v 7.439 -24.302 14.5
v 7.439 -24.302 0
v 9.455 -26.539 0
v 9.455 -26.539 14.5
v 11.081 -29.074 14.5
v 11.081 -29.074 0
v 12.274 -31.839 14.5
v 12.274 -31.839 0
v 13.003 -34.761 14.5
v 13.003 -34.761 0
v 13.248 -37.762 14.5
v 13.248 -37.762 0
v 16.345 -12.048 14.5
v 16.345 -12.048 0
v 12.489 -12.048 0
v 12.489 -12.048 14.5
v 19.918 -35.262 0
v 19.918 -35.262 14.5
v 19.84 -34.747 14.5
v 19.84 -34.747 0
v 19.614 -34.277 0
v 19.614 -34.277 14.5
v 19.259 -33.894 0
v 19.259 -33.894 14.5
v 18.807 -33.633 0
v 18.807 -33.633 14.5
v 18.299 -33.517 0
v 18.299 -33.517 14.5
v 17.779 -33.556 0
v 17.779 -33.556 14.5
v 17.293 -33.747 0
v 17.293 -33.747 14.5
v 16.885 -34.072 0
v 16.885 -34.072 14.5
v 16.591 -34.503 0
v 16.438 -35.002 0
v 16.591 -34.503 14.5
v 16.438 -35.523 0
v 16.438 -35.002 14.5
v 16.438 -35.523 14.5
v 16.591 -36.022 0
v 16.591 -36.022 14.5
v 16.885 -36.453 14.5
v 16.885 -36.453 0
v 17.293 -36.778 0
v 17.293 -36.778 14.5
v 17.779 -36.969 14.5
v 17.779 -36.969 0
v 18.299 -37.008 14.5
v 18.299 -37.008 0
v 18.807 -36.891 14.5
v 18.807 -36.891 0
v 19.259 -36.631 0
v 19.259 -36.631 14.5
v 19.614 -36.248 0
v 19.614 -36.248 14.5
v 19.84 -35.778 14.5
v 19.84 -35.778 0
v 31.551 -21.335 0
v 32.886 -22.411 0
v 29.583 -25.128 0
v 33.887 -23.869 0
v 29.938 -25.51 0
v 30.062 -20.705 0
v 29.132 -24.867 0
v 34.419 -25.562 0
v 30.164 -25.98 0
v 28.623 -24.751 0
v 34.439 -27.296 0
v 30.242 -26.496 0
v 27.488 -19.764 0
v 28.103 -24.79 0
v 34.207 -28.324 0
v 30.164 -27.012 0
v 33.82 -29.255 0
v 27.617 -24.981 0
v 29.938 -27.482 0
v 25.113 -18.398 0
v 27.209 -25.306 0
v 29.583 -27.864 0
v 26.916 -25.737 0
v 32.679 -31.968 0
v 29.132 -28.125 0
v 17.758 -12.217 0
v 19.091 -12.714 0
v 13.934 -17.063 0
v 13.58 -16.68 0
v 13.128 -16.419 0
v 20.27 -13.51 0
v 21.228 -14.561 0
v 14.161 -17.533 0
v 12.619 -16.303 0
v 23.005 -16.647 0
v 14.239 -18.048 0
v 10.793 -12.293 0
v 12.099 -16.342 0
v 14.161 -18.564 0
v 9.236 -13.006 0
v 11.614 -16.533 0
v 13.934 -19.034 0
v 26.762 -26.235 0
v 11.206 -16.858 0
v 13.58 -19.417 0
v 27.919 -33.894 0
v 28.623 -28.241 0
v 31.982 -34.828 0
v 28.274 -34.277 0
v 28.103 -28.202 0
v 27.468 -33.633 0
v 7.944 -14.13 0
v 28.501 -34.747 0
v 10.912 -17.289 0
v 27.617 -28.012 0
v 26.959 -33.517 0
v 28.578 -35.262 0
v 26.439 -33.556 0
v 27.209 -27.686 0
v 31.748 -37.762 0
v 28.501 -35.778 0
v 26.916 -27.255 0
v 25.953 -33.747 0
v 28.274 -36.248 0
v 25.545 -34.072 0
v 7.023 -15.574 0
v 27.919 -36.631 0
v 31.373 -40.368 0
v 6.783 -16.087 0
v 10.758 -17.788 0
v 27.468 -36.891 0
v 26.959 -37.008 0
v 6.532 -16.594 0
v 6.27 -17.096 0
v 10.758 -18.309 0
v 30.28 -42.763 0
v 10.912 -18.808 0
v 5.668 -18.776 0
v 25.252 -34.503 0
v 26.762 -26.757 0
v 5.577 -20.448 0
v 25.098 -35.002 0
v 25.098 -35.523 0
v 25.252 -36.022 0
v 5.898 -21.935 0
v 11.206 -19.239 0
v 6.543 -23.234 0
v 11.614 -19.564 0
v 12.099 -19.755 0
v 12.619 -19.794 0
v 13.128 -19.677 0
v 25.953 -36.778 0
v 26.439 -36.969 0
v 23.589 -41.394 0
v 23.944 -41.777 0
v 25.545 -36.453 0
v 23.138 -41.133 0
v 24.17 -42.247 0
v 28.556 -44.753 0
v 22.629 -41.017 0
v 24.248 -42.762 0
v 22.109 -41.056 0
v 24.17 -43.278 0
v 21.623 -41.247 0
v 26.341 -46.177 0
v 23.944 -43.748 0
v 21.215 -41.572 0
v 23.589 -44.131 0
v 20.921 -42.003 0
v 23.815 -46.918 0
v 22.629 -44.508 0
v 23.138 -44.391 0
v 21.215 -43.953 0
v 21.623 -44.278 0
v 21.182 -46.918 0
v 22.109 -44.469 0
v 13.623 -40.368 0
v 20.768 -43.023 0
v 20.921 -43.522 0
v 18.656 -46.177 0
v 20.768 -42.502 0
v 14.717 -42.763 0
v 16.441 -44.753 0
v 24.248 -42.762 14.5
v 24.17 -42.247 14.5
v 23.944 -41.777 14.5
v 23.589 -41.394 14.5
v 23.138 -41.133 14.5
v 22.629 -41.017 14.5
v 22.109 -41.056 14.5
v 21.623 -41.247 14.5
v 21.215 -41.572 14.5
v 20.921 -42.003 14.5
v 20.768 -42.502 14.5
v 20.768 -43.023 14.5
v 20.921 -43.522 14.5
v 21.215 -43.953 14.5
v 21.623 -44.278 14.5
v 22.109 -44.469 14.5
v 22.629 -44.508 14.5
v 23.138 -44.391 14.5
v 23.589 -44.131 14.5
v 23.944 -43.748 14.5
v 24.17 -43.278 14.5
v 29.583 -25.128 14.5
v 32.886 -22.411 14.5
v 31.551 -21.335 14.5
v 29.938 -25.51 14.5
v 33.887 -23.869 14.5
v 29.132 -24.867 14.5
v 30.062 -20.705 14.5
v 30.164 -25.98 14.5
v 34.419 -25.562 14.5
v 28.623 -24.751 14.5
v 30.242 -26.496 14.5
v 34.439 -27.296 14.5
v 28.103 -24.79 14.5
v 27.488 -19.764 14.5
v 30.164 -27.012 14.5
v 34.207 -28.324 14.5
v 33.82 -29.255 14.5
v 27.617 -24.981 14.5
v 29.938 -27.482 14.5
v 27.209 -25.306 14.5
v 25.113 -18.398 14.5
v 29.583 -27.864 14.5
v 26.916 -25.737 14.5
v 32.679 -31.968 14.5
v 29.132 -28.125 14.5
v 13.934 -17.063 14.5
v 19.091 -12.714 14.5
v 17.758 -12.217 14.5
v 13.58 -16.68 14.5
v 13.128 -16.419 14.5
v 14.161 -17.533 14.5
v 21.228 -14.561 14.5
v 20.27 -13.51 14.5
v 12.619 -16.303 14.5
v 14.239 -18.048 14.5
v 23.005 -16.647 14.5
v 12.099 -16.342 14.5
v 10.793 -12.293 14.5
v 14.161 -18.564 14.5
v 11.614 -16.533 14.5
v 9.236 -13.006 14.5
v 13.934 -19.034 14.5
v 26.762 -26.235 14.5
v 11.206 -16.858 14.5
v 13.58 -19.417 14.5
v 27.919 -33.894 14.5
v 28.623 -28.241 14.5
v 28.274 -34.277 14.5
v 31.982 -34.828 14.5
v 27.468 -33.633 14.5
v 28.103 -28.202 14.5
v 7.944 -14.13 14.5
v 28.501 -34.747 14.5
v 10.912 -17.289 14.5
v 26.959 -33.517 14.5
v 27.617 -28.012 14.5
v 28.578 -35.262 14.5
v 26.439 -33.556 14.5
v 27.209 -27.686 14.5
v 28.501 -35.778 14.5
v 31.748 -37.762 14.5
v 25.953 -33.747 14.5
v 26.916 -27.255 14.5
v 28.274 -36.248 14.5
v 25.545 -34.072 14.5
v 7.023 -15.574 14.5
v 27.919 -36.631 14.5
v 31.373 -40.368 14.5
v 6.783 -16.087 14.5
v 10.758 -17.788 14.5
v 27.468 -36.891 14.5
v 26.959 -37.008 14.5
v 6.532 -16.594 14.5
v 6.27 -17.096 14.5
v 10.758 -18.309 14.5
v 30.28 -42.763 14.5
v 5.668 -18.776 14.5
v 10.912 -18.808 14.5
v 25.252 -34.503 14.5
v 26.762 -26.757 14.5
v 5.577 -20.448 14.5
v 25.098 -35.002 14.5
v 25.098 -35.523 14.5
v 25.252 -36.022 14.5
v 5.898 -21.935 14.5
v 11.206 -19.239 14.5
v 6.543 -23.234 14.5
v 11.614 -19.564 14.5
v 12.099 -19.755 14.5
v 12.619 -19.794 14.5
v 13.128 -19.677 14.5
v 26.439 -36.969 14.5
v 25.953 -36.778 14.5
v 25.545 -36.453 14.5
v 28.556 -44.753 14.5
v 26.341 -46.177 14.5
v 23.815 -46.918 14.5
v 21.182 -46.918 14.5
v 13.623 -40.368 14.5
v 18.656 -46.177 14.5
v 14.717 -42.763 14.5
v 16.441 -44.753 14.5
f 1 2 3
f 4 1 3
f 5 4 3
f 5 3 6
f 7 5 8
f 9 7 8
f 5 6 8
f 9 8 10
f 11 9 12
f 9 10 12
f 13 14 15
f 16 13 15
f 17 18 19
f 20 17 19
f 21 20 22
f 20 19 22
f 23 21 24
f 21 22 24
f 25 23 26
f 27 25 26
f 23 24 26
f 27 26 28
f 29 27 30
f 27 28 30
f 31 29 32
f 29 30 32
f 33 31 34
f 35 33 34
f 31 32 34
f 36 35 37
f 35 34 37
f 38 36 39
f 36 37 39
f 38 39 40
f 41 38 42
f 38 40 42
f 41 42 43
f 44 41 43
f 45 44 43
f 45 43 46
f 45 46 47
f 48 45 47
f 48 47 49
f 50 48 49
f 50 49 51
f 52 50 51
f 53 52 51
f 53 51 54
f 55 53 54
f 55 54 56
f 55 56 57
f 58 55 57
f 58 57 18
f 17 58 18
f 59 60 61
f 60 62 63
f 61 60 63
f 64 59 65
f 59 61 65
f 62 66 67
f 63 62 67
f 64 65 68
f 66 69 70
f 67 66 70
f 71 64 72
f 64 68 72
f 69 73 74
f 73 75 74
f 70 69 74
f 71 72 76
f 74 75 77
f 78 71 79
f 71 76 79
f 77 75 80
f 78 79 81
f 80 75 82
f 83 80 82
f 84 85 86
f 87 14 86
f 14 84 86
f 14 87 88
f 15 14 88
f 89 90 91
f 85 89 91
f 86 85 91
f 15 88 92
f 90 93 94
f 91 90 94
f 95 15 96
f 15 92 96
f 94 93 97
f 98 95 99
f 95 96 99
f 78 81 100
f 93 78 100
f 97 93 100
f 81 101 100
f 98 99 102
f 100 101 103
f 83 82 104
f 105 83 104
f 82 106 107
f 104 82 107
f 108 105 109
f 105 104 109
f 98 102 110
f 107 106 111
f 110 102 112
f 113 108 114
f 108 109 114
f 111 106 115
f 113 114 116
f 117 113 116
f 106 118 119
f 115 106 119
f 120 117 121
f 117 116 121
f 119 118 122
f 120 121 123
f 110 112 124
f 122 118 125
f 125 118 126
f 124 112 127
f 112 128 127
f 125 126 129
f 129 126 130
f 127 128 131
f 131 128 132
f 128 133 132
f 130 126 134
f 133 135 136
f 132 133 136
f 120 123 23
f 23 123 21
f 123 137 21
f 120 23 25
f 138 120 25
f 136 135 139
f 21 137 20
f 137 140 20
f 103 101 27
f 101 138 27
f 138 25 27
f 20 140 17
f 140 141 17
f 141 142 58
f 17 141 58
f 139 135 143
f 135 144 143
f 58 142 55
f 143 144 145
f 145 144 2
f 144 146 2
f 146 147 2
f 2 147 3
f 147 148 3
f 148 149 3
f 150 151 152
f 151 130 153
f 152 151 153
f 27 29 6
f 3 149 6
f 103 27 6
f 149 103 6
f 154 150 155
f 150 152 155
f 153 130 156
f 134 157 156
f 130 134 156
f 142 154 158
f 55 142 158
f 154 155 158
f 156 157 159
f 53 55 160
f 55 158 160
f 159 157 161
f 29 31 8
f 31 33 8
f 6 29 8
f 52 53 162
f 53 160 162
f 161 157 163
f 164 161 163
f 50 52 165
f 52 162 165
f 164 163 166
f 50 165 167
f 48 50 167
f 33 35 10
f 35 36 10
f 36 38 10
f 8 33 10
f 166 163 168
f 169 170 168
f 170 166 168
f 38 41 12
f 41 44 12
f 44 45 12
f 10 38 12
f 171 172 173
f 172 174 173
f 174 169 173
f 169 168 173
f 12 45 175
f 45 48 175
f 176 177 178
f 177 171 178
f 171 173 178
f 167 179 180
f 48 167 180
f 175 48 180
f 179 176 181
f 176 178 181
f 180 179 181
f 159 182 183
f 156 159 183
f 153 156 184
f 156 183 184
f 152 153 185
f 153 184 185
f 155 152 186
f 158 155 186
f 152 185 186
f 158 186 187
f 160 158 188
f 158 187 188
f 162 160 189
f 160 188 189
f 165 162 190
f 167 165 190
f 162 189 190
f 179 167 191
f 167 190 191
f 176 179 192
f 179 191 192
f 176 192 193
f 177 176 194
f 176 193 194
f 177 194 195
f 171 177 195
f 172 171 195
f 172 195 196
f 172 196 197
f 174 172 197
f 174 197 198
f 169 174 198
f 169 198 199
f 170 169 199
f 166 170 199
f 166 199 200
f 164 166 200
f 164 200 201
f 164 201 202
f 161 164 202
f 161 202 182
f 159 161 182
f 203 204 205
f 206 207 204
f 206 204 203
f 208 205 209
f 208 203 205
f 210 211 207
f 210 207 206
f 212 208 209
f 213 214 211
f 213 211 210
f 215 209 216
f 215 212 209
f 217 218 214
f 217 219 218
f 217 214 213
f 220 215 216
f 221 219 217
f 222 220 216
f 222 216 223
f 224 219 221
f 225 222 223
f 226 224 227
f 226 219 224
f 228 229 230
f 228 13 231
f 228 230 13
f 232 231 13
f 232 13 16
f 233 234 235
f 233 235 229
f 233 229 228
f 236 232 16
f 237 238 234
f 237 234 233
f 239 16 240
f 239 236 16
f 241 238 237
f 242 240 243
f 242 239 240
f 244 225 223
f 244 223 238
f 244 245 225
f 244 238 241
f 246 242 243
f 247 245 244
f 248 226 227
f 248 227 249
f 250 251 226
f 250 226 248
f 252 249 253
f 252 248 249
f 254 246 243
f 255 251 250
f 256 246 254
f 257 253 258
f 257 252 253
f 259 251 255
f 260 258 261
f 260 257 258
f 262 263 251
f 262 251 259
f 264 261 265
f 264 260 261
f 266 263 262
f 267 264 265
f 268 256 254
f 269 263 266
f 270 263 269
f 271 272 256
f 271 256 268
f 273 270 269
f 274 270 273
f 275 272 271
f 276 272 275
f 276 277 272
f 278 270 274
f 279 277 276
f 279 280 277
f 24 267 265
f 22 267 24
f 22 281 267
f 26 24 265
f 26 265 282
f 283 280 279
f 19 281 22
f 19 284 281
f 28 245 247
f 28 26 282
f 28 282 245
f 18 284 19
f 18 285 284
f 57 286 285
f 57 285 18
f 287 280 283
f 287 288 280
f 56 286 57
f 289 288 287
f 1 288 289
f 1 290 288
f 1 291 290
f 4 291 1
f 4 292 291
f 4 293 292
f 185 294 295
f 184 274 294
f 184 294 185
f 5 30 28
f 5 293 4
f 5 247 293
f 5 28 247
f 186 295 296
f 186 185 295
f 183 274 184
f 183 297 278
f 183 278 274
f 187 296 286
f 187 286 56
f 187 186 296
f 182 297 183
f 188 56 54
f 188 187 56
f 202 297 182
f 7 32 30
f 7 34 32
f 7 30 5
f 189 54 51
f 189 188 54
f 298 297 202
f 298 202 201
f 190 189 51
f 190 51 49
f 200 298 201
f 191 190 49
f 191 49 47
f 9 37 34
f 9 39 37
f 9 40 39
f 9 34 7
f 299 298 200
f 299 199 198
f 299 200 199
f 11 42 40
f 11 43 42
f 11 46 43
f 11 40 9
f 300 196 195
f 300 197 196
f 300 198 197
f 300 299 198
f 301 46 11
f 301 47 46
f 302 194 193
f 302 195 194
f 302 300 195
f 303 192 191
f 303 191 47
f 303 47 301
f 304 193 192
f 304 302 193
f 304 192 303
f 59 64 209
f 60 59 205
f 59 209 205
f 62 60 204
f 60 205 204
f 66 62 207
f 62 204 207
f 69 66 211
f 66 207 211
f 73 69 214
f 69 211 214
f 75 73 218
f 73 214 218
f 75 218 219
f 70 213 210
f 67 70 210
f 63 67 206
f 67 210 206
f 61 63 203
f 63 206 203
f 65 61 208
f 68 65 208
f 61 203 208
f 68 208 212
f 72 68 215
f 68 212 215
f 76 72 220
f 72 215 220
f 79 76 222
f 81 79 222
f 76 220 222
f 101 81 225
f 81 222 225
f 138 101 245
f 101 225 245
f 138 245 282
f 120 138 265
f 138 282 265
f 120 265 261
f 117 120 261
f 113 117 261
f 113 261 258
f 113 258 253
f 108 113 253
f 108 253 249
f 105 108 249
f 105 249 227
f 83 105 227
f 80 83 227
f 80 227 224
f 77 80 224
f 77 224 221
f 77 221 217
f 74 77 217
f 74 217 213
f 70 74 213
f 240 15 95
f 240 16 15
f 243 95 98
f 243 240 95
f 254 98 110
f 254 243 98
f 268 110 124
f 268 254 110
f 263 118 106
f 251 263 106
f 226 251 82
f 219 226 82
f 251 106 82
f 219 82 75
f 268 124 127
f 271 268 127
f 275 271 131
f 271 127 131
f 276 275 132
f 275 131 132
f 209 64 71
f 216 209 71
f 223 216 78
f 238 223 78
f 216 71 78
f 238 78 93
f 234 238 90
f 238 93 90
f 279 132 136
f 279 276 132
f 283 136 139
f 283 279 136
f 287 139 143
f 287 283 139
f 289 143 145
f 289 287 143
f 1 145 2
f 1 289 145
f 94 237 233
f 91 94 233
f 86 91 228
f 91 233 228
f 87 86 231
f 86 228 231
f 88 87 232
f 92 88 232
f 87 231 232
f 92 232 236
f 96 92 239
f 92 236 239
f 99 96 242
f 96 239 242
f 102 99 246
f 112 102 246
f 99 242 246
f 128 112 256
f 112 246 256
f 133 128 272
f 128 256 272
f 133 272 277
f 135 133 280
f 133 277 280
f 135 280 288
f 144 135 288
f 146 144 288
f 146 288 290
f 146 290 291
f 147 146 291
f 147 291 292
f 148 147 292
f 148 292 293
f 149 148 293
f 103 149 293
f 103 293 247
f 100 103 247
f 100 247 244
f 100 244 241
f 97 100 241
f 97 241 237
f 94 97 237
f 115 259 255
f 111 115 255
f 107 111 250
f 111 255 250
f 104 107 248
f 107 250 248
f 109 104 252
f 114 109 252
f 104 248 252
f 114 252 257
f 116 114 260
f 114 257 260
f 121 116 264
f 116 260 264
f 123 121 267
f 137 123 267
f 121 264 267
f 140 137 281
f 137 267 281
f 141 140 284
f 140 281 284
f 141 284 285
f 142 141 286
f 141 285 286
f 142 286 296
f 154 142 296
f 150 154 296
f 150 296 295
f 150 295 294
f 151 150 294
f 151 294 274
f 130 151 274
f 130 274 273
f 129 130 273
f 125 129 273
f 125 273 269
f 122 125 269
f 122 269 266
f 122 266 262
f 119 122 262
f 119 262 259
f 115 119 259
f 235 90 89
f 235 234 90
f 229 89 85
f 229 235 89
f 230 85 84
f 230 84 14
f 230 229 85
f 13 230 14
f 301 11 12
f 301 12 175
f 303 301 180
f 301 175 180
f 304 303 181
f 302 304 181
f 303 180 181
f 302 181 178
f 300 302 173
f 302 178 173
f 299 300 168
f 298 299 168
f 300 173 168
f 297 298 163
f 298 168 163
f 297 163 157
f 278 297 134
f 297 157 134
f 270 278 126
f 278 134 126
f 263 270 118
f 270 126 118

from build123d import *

# Parameters (mm, degrees)
EXTRUDE_2_DEPTH     = 14.5
FILLET_2_R          = 6
CUT_EXTRUDE_1_REACH = 62.084
SKETCH_2_R          = 1.75


with BuildPart() as part:
    # 草图1 → 凸台-拉伸2 (new body)
    with BuildSketch(Plane(origin=(0, 0, 0), x_dir=(-1, 0, 0), z_dir=(0, 0, 1))):
        with BuildLine():
            Line((-37.405308562, 24.446583048), (-45.355478911, 16.778806877))
            ThreePointArc((-45.355478911, 16.778806877), (-31.34055986, 20.996004639), (-19.758509765, 12.048444717))
            Line((-19.758509765, 12.048444717), (-8.309528731, 12.048444717))
            ThreePointArc((-8.309528731, 12.048444717), (-6.330928861, 16.982098954), (-3.353982561, 21.385914608))
            ThreePointArc((-3.353982561, 21.385914608), (-10.582575483, 28.195748099), (-13.248153532, 37.762413217))
            ThreePointArc((-13.248153532, 37.762413217), (-22.498153532, 47.012413217), (-31.748153532, 37.762413217))
            ThreePointArc((-31.748153532, 37.762413217), (-33.221077565, 30.528556429), (-37.405308562, 24.446583048))
        make_face()
    extrude(amount=EXTRUDE_2_DEPTH)

    # 圆角2
    fillet_2_edges = [part.edges().sort_by_distance(p)[0] for p in [
        (19.758509765, -12.048444717, 7.25),
    ]]
    fillet(fillet_2_edges, radius=FILLET_2_R)
    fillet_2_2_edges = [part.edges().sort_by_distance(p)[0] for p in [
        (8.309528731, -12.048444717, 7.25),
    ]]
    fillet(fillet_2_2_edges, radius=FILLET_2_R)
    fillet_2_3_edges = [part.edges().sort_by_distance(p)[0] for p in [
        (3.353982561, -21.385914608, 7.25),
    ]]
    fillet(fillet_2_3_edges, radius=FILLET_2_R)
    fillet_2_4_edges = [part.edges().sort_by_distance(p)[0] for p in [
        (45.355478911, -16.778806877, 7.25),
    ]]
    fillet(fillet_2_4_edges, radius=FILLET_2_R)

    # 草图2 → 切除-拉伸1 (cut, up to next)
    with BuildSketch(Plane.XY.offset(14.5), mode=Mode.PRIVATE) as cut_extrude_1_sk1:
        with Locations((22.498153532, -42.762413217)):
            Circle(SKETCH_2_R)
    cut_extrude_1_tool1 = extrude(cut_extrude_1_sk1.sketch, amount=-CUT_EXTRUDE_1_REACH, mode=Mode.PRIVATE) & part.part
    # 草图2 → 切除-拉伸1 (cut, up to next)
    with BuildSketch(Plane.XY.offset(14.5), mode=Mode.PRIVATE) as cut_extrude_1_sk2:
        with Locations((18.168026513, -35.262413217)):
            Circle(SKETCH_2_R)
    cut_extrude_1_tool2 = extrude(cut_extrude_1_sk2.sketch, amount=-CUT_EXTRUDE_1_REACH, mode=Mode.PRIVATE) & part.part
    # 草图2 → 切除-拉伸1 (cut, up to next)
    with BuildSketch(Plane.XY.offset(14.5), mode=Mode.PRIVATE) as cut_extrude_1_sk3:
        with Locations((26.828280551, -35.262413217)):
            Circle(SKETCH_2_R)
    cut_extrude_1_tool3 = extrude(cut_extrude_1_sk3.sketch, amount=-CUT_EXTRUDE_1_REACH, mode=Mode.PRIVATE) & part.part
    # 草图2 → 切除-拉伸1 (cut, up to next)
    with BuildSketch(Plane.XY.offset(14.5), mode=Mode.PRIVATE) as cut_extrude_1_sk4:
        with Locations((28.492231625, -26.496097848)):
            Circle(SKETCH_2_R)
    cut_extrude_1_tool4 = extrude(cut_extrude_1_sk4.sketch, amount=-CUT_EXTRUDE_1_REACH, mode=Mode.PRIVATE) & part.part
    # 草图2 → 切除-拉伸1 (cut, up to next)
    with BuildSketch(Plane.XY.offset(14.5), mode=Mode.PRIVATE) as cut_extrude_1_sk5:
        with Locations((12.488504069, -18.048444717)):
            Circle(SKETCH_2_R)
    cut_extrude_1_tool5 = extrude(cut_extrude_1_sk5.sketch, amount=-CUT_EXTRUDE_1_REACH, mode=Mode.PRIVATE) & part.part
    add(cut_extrude_1_tool1.solids().sort_by_distance((22.498154, -42.762413, 14.5))[0], mode=Mode.SUBTRACT)
    add(cut_extrude_1_tool2.solids().sort_by_distance((18.168027, -35.262413, 14.5))[0], mode=Mode.SUBTRACT)
    add(cut_extrude_1_tool3.solids().sort_by_distance((26.828281, -35.262413, 14.5))[0], mode=Mode.SUBTRACT)
    add(cut_extrude_1_tool4.solids().sort_by_distance((28.492232, -26.496098, 14.5))[0], mode=Mode.SUBTRACT)
    add(cut_extrude_1_tool5.solids().sort_by_distance((12.488504, -18.048445, 14.5))[0], mode=Mode.SUBTRACT)


solid = part.part
